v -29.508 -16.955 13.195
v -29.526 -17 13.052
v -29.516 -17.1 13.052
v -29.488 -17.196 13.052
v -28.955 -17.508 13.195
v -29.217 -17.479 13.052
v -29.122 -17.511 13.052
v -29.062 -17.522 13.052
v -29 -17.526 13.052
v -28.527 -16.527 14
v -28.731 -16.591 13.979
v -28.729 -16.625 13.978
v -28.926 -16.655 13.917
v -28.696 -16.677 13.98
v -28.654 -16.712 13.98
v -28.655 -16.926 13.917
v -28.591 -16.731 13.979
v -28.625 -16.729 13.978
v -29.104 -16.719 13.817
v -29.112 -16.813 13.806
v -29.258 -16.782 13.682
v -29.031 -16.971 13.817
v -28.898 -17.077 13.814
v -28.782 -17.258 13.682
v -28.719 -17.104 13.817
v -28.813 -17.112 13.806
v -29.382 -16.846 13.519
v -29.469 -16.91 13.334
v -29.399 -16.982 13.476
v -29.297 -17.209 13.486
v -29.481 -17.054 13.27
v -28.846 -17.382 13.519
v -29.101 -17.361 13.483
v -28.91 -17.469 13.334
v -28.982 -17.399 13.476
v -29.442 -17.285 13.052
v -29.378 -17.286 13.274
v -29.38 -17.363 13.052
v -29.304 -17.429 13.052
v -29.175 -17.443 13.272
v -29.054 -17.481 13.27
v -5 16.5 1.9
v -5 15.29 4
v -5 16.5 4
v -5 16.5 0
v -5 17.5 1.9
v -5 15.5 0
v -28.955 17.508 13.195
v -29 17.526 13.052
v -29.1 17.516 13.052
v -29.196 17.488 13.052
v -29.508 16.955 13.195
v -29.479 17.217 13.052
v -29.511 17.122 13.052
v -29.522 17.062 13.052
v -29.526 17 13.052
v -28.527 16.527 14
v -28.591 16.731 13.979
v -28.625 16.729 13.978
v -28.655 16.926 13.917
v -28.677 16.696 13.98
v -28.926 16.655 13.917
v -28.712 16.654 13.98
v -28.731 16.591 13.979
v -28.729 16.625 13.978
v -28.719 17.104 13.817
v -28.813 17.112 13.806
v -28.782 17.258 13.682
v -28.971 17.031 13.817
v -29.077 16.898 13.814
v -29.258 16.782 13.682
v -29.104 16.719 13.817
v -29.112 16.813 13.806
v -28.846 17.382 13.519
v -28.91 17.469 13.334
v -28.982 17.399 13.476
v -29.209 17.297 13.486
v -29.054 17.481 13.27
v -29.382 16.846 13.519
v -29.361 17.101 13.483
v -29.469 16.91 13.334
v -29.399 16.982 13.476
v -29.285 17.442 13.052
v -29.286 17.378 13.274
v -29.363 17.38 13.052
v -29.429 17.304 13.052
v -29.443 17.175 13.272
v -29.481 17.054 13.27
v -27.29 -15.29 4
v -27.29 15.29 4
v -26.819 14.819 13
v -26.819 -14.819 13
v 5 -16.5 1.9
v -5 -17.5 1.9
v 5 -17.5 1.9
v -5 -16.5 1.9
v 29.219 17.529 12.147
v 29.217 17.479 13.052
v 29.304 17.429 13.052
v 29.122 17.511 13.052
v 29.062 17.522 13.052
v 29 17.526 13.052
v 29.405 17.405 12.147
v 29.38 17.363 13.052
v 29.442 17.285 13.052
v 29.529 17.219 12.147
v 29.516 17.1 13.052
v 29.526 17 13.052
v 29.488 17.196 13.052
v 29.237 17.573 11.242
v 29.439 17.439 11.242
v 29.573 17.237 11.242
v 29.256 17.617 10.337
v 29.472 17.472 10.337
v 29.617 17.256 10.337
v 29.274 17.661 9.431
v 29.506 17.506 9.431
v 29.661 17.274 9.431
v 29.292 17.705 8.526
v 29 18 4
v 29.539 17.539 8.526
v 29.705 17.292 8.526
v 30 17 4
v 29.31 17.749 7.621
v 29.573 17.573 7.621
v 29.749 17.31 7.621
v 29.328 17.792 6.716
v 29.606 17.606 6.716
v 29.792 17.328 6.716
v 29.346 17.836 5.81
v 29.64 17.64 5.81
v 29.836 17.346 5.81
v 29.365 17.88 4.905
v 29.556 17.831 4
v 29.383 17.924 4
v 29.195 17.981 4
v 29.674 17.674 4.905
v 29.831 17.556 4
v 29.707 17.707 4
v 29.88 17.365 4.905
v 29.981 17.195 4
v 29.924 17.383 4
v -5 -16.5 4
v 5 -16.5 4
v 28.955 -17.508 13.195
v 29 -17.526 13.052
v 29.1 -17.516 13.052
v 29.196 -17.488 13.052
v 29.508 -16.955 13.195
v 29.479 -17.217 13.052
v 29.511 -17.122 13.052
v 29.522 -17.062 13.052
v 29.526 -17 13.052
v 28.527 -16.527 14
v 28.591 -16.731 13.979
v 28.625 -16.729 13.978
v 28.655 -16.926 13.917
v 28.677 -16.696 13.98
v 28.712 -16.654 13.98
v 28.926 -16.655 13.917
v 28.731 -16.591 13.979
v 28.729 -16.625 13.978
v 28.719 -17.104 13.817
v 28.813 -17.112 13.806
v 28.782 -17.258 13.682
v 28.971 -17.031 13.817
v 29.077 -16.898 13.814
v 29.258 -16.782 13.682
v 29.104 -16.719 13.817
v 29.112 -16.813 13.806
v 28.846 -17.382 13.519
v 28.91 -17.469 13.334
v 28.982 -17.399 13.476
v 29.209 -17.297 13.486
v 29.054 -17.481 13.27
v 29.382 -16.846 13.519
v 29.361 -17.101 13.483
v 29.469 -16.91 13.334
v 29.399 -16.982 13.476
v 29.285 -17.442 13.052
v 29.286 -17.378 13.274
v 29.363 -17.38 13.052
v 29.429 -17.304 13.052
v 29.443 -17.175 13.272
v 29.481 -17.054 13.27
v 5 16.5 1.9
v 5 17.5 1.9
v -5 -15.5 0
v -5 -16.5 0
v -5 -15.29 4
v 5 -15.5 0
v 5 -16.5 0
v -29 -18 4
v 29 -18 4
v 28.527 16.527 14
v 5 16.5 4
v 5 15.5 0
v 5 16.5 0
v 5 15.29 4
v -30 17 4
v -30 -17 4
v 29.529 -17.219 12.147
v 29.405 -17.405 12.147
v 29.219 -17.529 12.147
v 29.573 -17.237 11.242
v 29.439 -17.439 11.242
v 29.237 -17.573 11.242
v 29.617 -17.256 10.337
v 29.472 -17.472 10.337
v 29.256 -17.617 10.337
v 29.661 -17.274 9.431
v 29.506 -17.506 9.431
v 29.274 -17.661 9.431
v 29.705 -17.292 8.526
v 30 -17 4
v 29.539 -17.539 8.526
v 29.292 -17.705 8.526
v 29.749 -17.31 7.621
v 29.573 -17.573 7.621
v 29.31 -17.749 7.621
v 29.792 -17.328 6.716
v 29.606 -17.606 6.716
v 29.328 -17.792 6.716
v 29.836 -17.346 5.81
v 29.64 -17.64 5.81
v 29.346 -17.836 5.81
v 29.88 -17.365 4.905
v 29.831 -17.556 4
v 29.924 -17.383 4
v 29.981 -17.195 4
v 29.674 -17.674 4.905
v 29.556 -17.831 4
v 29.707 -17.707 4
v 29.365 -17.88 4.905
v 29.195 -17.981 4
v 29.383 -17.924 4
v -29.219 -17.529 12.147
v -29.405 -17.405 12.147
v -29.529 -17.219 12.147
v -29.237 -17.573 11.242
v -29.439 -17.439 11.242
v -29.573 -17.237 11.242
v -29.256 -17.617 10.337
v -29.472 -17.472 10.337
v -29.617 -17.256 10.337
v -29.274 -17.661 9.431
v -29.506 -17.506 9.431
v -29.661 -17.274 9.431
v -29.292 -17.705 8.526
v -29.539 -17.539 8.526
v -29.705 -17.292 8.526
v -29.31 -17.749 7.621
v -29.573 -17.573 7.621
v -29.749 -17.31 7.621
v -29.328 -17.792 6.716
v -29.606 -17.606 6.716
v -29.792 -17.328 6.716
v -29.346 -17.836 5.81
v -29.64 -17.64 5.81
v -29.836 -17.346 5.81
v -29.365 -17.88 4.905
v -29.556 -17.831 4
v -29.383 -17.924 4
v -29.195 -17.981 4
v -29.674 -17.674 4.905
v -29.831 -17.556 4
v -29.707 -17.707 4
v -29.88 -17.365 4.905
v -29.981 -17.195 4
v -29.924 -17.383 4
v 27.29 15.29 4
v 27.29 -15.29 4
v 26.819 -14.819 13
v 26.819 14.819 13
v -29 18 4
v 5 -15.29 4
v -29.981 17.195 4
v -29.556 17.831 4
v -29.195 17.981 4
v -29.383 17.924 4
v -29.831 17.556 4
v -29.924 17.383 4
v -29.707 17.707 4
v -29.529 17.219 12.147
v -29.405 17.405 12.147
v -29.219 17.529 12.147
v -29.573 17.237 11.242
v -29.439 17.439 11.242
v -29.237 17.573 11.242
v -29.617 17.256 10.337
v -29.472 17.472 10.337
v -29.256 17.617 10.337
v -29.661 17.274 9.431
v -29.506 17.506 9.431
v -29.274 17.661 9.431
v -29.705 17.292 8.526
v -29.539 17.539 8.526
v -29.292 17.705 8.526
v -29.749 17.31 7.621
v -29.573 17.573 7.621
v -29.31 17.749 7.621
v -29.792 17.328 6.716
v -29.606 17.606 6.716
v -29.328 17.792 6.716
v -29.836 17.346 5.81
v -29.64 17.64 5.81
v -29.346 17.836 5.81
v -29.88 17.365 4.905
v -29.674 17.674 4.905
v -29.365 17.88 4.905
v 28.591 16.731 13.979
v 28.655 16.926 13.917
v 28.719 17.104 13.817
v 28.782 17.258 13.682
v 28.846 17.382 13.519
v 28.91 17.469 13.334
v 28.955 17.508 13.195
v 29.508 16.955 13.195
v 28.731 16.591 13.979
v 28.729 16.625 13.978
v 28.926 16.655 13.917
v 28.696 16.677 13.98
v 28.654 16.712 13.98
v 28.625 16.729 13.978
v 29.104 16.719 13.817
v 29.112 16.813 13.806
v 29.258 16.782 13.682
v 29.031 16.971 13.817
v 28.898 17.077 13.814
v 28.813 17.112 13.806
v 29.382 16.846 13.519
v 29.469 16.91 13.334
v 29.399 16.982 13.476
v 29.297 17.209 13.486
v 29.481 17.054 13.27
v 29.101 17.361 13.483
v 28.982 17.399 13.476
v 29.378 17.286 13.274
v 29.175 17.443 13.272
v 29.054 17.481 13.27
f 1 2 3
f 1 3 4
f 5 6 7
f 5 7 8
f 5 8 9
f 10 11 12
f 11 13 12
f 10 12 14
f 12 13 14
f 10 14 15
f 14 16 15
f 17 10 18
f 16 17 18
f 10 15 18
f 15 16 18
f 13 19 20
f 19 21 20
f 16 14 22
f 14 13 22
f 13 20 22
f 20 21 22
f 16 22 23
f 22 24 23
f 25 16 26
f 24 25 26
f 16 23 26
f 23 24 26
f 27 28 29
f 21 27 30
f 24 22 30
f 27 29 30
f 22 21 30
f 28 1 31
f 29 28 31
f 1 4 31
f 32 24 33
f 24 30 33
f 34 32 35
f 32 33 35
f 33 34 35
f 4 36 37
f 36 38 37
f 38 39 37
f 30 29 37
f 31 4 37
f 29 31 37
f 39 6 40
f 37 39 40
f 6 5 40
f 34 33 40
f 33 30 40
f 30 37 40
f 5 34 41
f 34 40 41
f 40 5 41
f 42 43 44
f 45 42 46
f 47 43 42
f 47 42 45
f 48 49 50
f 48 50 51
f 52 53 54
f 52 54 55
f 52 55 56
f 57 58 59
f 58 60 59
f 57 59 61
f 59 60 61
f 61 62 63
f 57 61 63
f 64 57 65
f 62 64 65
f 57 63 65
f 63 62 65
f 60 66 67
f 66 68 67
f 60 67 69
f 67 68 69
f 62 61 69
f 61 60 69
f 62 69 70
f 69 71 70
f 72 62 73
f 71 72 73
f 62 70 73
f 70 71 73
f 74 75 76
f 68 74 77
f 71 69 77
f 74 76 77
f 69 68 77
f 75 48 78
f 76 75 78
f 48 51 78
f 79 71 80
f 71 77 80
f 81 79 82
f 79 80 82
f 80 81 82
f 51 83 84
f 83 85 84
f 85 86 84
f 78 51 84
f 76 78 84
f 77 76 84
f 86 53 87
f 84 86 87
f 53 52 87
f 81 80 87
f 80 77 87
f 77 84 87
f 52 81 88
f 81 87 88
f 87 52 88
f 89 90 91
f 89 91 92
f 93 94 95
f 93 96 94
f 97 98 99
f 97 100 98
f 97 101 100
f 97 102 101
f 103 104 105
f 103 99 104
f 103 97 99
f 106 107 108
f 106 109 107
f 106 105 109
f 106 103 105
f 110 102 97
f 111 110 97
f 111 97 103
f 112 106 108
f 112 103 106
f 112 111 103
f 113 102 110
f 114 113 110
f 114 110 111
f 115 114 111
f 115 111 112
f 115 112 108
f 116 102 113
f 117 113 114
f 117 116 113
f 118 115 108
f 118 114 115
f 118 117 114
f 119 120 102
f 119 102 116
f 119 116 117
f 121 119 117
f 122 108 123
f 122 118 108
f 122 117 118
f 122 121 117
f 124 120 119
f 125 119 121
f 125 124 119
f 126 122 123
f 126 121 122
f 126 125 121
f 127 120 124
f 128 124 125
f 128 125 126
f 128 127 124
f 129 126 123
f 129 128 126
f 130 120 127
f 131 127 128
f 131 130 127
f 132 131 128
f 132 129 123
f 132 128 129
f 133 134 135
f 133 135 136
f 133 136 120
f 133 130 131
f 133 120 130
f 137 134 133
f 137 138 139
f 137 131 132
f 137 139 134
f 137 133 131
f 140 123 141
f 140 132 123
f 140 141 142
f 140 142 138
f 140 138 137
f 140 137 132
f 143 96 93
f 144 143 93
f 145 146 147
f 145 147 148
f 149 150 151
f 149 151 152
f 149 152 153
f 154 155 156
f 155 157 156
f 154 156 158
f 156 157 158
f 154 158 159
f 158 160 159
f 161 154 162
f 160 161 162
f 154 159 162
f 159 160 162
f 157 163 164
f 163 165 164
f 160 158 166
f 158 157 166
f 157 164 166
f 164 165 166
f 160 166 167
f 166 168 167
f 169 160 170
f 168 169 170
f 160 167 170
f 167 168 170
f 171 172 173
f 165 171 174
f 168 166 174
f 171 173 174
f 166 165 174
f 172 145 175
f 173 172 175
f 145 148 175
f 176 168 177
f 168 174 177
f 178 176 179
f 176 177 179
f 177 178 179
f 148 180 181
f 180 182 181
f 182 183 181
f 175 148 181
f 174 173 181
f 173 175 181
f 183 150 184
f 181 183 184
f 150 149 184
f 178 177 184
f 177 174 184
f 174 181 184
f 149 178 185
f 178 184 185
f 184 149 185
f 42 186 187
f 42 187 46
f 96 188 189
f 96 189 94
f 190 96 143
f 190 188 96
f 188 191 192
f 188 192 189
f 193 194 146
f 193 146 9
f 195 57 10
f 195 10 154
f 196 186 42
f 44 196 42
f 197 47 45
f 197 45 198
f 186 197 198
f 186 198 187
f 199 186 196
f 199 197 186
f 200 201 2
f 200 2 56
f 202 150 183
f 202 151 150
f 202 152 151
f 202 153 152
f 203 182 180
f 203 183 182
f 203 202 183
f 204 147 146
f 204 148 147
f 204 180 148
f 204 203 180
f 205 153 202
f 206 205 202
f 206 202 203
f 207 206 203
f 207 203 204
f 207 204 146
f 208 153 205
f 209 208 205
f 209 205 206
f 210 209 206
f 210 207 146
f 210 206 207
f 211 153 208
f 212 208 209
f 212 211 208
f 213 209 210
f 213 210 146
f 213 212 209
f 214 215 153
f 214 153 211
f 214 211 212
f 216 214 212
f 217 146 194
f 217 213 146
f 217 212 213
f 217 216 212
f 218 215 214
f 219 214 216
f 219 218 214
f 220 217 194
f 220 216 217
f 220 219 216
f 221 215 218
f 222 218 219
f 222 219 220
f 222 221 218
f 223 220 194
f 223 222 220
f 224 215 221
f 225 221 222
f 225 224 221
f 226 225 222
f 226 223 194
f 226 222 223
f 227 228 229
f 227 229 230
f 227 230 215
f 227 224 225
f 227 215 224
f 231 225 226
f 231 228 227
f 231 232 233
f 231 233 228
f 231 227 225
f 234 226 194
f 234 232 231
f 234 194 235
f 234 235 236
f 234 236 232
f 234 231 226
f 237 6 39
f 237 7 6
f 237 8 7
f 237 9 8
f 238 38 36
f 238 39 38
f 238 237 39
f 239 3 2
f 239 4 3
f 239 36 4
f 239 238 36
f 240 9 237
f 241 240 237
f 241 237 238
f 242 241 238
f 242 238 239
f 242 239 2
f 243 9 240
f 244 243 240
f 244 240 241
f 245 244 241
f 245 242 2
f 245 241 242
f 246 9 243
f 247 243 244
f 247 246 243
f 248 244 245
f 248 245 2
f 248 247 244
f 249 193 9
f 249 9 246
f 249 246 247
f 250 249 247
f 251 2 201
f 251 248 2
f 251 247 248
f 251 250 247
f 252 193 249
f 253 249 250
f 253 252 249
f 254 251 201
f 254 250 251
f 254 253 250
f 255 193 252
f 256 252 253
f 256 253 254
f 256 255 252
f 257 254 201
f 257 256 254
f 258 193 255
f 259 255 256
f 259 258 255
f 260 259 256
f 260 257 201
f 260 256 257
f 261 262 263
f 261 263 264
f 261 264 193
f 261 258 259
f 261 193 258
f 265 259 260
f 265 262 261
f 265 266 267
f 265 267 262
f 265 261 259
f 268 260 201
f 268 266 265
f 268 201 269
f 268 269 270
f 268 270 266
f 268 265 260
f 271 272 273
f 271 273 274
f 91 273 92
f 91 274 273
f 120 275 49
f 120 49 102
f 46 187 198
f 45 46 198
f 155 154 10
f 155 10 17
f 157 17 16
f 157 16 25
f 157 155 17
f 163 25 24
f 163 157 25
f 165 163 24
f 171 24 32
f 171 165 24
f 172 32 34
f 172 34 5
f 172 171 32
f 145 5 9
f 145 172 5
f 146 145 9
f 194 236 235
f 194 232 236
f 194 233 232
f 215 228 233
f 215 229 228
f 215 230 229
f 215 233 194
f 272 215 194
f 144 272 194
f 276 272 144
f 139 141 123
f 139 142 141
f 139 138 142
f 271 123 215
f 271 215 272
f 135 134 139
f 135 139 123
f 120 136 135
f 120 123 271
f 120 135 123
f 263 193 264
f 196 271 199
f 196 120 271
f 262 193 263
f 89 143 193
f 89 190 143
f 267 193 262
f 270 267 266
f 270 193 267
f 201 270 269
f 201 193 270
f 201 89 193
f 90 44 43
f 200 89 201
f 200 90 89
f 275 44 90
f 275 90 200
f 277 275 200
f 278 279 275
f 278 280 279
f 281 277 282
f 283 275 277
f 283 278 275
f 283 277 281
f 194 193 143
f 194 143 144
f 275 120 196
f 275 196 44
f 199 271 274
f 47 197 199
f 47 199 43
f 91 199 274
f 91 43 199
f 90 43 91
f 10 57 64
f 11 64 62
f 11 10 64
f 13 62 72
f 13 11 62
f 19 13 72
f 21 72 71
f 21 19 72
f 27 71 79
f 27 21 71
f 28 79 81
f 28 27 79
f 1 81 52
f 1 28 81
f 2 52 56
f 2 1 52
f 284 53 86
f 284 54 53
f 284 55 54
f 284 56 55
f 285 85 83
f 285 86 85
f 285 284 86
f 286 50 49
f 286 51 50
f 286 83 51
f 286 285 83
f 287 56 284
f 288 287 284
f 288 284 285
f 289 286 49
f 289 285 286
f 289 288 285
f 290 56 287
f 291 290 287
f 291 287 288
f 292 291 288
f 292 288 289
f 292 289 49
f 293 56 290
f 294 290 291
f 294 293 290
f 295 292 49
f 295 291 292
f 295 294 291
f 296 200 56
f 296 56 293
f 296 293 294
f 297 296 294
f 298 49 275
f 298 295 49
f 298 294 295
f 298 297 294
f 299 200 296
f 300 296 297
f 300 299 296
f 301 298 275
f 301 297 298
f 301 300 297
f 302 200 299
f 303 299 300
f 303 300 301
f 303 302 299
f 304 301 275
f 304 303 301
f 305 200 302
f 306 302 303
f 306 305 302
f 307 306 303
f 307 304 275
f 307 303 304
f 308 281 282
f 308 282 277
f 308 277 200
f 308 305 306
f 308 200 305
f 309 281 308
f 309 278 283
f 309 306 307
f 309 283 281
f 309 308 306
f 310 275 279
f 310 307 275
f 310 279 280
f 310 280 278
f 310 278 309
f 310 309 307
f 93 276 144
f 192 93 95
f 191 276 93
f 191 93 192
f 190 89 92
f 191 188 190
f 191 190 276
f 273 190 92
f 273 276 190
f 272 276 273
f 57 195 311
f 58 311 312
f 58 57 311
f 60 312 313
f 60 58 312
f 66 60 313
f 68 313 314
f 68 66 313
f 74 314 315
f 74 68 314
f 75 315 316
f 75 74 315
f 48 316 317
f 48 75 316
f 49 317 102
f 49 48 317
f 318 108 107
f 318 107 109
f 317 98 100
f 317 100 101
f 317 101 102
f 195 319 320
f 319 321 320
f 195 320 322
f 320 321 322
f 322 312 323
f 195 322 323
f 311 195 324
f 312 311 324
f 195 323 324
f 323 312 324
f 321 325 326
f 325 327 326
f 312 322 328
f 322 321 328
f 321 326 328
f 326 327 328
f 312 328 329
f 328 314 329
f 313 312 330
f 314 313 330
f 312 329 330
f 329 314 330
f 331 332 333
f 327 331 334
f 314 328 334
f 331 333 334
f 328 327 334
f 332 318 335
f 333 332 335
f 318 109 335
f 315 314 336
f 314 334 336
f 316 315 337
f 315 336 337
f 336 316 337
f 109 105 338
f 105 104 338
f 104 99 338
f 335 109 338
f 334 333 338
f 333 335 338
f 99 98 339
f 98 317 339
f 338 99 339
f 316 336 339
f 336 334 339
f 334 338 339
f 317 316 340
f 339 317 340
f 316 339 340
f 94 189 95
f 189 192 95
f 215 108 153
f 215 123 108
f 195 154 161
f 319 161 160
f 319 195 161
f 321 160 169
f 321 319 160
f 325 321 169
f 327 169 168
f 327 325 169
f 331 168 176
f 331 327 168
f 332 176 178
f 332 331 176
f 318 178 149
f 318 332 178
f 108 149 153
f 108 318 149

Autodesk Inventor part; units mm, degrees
ref_plane "YZ Plane" through (0, 0, 0) normal (1, 0, 0) x (0, 1, 0)
ref_plane "XZ Plane" through (0, 0, 0) normal (0, 1, 0) x (-1, 0, 0)
ref_plane "XY Plane" through (0, 0, 0) normal (0, 0, 1) x (1, 0, 0)
sketch "Эскиз1" plane through (0, 0, 0) normal (0, 0, 1) x (1, 0, 0)
  line L0 (-29, 18) -> (29, 18)
  line L1 (30, 17) -> (30, -17)
  line L2 (29, -18) -> (-29, -18)
  line L3 (-30, -17) -> (-30, 17)
  arc A0 (-29, 18) -> (-30, 17) centre (-29, 17) ccw
  arc A1 (-30, -17) -> (-29, -18) centre (-29, -17) ccw
  arc A2 (29, -18) -> (30, -17) centre (29, -17) ccw
  arc A3 (30, 17) -> (29, 18) centre (29, 17) ccw
  point P0 (0, 0)
  point P1 (-30, 18)
  point P2 (30, 18)
  point P3 (-30, -18)
  dimension "d0" = 60
  dimension "d1" = 36
  dimension "d2" = 18
  dimension "d3" = 30
  dimension "d4" = 1
extrude "Выдавливание1" add sketch "Эскиз1" along normal blind 4
sketch "Эскиз3" plane through (0, 0, 4) normal (0, 0, 1) x (1, 0, 0)
  line L0 (-29, 18) -> (29, 18)
  line L1 (30, 17) -> (30, -17)
  line L2 (29, -18) -> (-29, -18)
  line L3 (-30, -17) -> (-30, 17)
  line L4 (30, -17) -> (30, 17) projected
  line L5 (-29, -18) -> (29, -18) projected
  line L6 (-30, 17) -> (-30, -17) projected
  line L7 (29, 18) -> (-29, 18) projected
  arc A0 (-29, 18) -> (-30, 17) centre (-29, 17) ccw
  arc A1 (-30, -17) -> (-29, -18) centre (-29, -17) ccw
  arc A2 (29, -18) -> (30, -17) centre (29, -17) ccw
  arc A3 (30, 17) -> (29, 18) centre (29, 17) ccw
  point P0 (0, 0)
  dimension "d7" = 0
  dimension "d8" = 0
  dimension "d9" = 0
  dimension "d10" = 0
  dimension "d11" = 1
extrude "Выдавливание2" add sketch "Эскиз3" along normal blind 10 draft -3
sketch "Эскиз4" plane through (0, 0, 0) normal (0, 0, -1) x (-1, 0, 0)
  line L0 (-27.5, 15.5) -> (27.5, 15.5)
  line L1 (27.5, 15.5) -> (27.5, -15.5)
  line L2 (27.5, -15.5) -> (-27.5, -15.5)
  line L3 (-27.5, -15.5) -> (-27.5, 15.5)
  point P0 (0, 0)
  dimension "d14" = 15.5
  dimension "d15" = 31
  dimension "d16" = 27.5
  dimension "d17" = 55
extrude "Выдавливание3" cut sketch "Эскиз4" against normal blind 13 draft -3
sketch "Эскиз5" plane through (0, 0, 0) normal (0, 0, -1) x (-1, 0, 0)
  line L0 (-28.5, 16.5) -> (28.5, 16.5)
  line L1 (28.5, 16.5) -> (28.5, -16.5)
  line L2 (28.5, -16.5) -> (-28.5, -16.5)
  line L3 (-28.5, -16.5) -> (-28.5, 16.5)
  line L4 (-29, 18) -> (29, 18) projected
  line L5 (-30, -17) -> (-30, 17) projected
  line L6 (29, -18) -> (-29, -18) projected
  line L7 (30, 17) -> (30, -17) projected
  line L8 (-29, 18) -> (29, 18)
  line L9 (30, 17) -> (30, -17)
  line L10 (29, -18) -> (-29, -18)
  line L11 (-30, -17) -> (-30, 17)
  arc A0 (-29, 18) -> (-30, 17) centre (-29, 17) ccw
  arc A1 (-30, -17) -> (-29, -18) centre (-29, -17) ccw
  arc A2 (29, -18) -> (30, -17) centre (29, -17) ccw
  arc A3 (30, 17) -> (29, 18) centre (29, 17) ccw
  point P0 (0, 0)
  point P1 (29, 18)
  dimension "d20" = 1.5
  dimension "d21" = 1.5
  dimension "d22" = 1.5
  dimension "d23" = 1.5
  dimension "d24" = 0
  dimension "d25" = 0
  dimension "d26" = 0
  dimension "d27" = 0
  dimension "d28" = 1
extrude "Выдавливание4" cut sketch "Эскиз5" against normal blind 4
fillet "Сопряжение1" radius 1 8 edges at (-29.3365, -17.3365, 14) (-29.4759, 0, 14) (-29.3365, 17.3365, 14) (0, 17.4759, 14) (29.3365, 17.3365, 14) (29.4759, 0, 14) (29.3365, -17.3365, 14) (0, -17.4759, 14)
sketch "Эскиз6" plane through (-28.5, -16.5, 0) normal (0, -1, 0) x (1, 0, 0)
  line L0 (0, 4) -> (23.5, 4)
  line L1 (23.5, 4) -> (23.5, 0)
  line L2 (23.5, 0) -> (0, 0)
  line L3 (0, 0) -> (0, 4)
  line L4 (33.5, 4) -> (57, 4)
  line L5 (57, 4) -> (57, 0)
  line L6 (57, 0) -> (33.5, 0)
  line L7 (33.5, 0) -> (33.5, 4)
  line L8 (-0.5, 4) -> (57.5, 4) projected
  line L9 (57, 0) -> (0, 0) projected
  line L10 (0, 0) -> (0, 4) projected
  line L11 (57, 0) -> (57, 4) projected
  point P0 (28.5, 0)
  dimension "d32" = 0
  dimension "d33" = 0
  dimension "d34" = 0
  dimension "d35" = 23.5
  dimension "d36" = 0
  dimension "d37" = 23.5
extrude "Выдавливание5" cut sketch "Эскиз6" against normal through all contours L0 L1 L2 L3 | L4 L5 L6 L7
sketch "Эскиз8" plane through (-5, -16.5, 0) normal (0, -1, 0) x (1, 0, 0)
  line L0 (0, 1.9) -> (10, 1.9)
  line L1 (10, 1.9) -> (10, 0)
  line L2 (10, 0) -> (0, 0)
  line L3 (0, 0) -> (0, 1.9)
  line L4 (0, 4) -> (0, 0) projected
  line L5 (10, 0) -> (0, 0) projected
  line L6 (10, 0) -> (10, 4) projected
  point P0 (5, 0)
  dimension "d43" = 0
  dimension "d44" = 0
  dimension "d45" = 0
  dimension "d46" = 1.9
extrude "Выдавливание6" add sketch "Эскиз8" along normal blind 1
sketch "Эскиз9" plane through (-5, 16.5, 0) normal (0, 1, 0) x (1, 0, 0)
  line L0 (10, -1.9) -> (0, -1.9)
  line L1 (0, -1.9) -> (0, 0)
  line L2 (0, 0) -> (10, 0)
  line L3 (10, 0) -> (10, -1.9)
  line L4 (0, 0) -> (10, 0) projected
  line L5 (10, -4) -> (10, 0) projected
  line L6 (0, 0) -> (0, -4) projected
  point P0 (5, 0)
  dimension "d49" = 0
  dimension "d50" = 0
  dimension "d51" = 0
  dimension "d52" = 1.9
extrude "Выдавливание7" add sketch "Эскиз9" along normal blind 1
sketch "Эскиз10" plane through (5, -16.5, 4) normal (1, 0, 0) x (0, 0, -1)
  line L0 (4, 0) -> (2.1, -1)
  line L1 (4, 34) -> (2.1, 34) projected
  line L2 (2.1, 34) -> (4, 33)
  line L3 (2.1, 34) -> (4, 34)
  line L4 (4, 33) -> (4, 34)
  line L5 (2.1, -1) -> (4, -1) projected
  line L6 (2.1, -1) -> (4, -1)
  line L7 (4, -1) -> (4, 0)
  line L8 (4, -1) -> (4, 1) projected
  point P0 (4, 16.5)
extrude "Выдавливание8" cut sketch "Эскиз10" against normal through all
properties part number "case_up" material "Пластик АБС"
